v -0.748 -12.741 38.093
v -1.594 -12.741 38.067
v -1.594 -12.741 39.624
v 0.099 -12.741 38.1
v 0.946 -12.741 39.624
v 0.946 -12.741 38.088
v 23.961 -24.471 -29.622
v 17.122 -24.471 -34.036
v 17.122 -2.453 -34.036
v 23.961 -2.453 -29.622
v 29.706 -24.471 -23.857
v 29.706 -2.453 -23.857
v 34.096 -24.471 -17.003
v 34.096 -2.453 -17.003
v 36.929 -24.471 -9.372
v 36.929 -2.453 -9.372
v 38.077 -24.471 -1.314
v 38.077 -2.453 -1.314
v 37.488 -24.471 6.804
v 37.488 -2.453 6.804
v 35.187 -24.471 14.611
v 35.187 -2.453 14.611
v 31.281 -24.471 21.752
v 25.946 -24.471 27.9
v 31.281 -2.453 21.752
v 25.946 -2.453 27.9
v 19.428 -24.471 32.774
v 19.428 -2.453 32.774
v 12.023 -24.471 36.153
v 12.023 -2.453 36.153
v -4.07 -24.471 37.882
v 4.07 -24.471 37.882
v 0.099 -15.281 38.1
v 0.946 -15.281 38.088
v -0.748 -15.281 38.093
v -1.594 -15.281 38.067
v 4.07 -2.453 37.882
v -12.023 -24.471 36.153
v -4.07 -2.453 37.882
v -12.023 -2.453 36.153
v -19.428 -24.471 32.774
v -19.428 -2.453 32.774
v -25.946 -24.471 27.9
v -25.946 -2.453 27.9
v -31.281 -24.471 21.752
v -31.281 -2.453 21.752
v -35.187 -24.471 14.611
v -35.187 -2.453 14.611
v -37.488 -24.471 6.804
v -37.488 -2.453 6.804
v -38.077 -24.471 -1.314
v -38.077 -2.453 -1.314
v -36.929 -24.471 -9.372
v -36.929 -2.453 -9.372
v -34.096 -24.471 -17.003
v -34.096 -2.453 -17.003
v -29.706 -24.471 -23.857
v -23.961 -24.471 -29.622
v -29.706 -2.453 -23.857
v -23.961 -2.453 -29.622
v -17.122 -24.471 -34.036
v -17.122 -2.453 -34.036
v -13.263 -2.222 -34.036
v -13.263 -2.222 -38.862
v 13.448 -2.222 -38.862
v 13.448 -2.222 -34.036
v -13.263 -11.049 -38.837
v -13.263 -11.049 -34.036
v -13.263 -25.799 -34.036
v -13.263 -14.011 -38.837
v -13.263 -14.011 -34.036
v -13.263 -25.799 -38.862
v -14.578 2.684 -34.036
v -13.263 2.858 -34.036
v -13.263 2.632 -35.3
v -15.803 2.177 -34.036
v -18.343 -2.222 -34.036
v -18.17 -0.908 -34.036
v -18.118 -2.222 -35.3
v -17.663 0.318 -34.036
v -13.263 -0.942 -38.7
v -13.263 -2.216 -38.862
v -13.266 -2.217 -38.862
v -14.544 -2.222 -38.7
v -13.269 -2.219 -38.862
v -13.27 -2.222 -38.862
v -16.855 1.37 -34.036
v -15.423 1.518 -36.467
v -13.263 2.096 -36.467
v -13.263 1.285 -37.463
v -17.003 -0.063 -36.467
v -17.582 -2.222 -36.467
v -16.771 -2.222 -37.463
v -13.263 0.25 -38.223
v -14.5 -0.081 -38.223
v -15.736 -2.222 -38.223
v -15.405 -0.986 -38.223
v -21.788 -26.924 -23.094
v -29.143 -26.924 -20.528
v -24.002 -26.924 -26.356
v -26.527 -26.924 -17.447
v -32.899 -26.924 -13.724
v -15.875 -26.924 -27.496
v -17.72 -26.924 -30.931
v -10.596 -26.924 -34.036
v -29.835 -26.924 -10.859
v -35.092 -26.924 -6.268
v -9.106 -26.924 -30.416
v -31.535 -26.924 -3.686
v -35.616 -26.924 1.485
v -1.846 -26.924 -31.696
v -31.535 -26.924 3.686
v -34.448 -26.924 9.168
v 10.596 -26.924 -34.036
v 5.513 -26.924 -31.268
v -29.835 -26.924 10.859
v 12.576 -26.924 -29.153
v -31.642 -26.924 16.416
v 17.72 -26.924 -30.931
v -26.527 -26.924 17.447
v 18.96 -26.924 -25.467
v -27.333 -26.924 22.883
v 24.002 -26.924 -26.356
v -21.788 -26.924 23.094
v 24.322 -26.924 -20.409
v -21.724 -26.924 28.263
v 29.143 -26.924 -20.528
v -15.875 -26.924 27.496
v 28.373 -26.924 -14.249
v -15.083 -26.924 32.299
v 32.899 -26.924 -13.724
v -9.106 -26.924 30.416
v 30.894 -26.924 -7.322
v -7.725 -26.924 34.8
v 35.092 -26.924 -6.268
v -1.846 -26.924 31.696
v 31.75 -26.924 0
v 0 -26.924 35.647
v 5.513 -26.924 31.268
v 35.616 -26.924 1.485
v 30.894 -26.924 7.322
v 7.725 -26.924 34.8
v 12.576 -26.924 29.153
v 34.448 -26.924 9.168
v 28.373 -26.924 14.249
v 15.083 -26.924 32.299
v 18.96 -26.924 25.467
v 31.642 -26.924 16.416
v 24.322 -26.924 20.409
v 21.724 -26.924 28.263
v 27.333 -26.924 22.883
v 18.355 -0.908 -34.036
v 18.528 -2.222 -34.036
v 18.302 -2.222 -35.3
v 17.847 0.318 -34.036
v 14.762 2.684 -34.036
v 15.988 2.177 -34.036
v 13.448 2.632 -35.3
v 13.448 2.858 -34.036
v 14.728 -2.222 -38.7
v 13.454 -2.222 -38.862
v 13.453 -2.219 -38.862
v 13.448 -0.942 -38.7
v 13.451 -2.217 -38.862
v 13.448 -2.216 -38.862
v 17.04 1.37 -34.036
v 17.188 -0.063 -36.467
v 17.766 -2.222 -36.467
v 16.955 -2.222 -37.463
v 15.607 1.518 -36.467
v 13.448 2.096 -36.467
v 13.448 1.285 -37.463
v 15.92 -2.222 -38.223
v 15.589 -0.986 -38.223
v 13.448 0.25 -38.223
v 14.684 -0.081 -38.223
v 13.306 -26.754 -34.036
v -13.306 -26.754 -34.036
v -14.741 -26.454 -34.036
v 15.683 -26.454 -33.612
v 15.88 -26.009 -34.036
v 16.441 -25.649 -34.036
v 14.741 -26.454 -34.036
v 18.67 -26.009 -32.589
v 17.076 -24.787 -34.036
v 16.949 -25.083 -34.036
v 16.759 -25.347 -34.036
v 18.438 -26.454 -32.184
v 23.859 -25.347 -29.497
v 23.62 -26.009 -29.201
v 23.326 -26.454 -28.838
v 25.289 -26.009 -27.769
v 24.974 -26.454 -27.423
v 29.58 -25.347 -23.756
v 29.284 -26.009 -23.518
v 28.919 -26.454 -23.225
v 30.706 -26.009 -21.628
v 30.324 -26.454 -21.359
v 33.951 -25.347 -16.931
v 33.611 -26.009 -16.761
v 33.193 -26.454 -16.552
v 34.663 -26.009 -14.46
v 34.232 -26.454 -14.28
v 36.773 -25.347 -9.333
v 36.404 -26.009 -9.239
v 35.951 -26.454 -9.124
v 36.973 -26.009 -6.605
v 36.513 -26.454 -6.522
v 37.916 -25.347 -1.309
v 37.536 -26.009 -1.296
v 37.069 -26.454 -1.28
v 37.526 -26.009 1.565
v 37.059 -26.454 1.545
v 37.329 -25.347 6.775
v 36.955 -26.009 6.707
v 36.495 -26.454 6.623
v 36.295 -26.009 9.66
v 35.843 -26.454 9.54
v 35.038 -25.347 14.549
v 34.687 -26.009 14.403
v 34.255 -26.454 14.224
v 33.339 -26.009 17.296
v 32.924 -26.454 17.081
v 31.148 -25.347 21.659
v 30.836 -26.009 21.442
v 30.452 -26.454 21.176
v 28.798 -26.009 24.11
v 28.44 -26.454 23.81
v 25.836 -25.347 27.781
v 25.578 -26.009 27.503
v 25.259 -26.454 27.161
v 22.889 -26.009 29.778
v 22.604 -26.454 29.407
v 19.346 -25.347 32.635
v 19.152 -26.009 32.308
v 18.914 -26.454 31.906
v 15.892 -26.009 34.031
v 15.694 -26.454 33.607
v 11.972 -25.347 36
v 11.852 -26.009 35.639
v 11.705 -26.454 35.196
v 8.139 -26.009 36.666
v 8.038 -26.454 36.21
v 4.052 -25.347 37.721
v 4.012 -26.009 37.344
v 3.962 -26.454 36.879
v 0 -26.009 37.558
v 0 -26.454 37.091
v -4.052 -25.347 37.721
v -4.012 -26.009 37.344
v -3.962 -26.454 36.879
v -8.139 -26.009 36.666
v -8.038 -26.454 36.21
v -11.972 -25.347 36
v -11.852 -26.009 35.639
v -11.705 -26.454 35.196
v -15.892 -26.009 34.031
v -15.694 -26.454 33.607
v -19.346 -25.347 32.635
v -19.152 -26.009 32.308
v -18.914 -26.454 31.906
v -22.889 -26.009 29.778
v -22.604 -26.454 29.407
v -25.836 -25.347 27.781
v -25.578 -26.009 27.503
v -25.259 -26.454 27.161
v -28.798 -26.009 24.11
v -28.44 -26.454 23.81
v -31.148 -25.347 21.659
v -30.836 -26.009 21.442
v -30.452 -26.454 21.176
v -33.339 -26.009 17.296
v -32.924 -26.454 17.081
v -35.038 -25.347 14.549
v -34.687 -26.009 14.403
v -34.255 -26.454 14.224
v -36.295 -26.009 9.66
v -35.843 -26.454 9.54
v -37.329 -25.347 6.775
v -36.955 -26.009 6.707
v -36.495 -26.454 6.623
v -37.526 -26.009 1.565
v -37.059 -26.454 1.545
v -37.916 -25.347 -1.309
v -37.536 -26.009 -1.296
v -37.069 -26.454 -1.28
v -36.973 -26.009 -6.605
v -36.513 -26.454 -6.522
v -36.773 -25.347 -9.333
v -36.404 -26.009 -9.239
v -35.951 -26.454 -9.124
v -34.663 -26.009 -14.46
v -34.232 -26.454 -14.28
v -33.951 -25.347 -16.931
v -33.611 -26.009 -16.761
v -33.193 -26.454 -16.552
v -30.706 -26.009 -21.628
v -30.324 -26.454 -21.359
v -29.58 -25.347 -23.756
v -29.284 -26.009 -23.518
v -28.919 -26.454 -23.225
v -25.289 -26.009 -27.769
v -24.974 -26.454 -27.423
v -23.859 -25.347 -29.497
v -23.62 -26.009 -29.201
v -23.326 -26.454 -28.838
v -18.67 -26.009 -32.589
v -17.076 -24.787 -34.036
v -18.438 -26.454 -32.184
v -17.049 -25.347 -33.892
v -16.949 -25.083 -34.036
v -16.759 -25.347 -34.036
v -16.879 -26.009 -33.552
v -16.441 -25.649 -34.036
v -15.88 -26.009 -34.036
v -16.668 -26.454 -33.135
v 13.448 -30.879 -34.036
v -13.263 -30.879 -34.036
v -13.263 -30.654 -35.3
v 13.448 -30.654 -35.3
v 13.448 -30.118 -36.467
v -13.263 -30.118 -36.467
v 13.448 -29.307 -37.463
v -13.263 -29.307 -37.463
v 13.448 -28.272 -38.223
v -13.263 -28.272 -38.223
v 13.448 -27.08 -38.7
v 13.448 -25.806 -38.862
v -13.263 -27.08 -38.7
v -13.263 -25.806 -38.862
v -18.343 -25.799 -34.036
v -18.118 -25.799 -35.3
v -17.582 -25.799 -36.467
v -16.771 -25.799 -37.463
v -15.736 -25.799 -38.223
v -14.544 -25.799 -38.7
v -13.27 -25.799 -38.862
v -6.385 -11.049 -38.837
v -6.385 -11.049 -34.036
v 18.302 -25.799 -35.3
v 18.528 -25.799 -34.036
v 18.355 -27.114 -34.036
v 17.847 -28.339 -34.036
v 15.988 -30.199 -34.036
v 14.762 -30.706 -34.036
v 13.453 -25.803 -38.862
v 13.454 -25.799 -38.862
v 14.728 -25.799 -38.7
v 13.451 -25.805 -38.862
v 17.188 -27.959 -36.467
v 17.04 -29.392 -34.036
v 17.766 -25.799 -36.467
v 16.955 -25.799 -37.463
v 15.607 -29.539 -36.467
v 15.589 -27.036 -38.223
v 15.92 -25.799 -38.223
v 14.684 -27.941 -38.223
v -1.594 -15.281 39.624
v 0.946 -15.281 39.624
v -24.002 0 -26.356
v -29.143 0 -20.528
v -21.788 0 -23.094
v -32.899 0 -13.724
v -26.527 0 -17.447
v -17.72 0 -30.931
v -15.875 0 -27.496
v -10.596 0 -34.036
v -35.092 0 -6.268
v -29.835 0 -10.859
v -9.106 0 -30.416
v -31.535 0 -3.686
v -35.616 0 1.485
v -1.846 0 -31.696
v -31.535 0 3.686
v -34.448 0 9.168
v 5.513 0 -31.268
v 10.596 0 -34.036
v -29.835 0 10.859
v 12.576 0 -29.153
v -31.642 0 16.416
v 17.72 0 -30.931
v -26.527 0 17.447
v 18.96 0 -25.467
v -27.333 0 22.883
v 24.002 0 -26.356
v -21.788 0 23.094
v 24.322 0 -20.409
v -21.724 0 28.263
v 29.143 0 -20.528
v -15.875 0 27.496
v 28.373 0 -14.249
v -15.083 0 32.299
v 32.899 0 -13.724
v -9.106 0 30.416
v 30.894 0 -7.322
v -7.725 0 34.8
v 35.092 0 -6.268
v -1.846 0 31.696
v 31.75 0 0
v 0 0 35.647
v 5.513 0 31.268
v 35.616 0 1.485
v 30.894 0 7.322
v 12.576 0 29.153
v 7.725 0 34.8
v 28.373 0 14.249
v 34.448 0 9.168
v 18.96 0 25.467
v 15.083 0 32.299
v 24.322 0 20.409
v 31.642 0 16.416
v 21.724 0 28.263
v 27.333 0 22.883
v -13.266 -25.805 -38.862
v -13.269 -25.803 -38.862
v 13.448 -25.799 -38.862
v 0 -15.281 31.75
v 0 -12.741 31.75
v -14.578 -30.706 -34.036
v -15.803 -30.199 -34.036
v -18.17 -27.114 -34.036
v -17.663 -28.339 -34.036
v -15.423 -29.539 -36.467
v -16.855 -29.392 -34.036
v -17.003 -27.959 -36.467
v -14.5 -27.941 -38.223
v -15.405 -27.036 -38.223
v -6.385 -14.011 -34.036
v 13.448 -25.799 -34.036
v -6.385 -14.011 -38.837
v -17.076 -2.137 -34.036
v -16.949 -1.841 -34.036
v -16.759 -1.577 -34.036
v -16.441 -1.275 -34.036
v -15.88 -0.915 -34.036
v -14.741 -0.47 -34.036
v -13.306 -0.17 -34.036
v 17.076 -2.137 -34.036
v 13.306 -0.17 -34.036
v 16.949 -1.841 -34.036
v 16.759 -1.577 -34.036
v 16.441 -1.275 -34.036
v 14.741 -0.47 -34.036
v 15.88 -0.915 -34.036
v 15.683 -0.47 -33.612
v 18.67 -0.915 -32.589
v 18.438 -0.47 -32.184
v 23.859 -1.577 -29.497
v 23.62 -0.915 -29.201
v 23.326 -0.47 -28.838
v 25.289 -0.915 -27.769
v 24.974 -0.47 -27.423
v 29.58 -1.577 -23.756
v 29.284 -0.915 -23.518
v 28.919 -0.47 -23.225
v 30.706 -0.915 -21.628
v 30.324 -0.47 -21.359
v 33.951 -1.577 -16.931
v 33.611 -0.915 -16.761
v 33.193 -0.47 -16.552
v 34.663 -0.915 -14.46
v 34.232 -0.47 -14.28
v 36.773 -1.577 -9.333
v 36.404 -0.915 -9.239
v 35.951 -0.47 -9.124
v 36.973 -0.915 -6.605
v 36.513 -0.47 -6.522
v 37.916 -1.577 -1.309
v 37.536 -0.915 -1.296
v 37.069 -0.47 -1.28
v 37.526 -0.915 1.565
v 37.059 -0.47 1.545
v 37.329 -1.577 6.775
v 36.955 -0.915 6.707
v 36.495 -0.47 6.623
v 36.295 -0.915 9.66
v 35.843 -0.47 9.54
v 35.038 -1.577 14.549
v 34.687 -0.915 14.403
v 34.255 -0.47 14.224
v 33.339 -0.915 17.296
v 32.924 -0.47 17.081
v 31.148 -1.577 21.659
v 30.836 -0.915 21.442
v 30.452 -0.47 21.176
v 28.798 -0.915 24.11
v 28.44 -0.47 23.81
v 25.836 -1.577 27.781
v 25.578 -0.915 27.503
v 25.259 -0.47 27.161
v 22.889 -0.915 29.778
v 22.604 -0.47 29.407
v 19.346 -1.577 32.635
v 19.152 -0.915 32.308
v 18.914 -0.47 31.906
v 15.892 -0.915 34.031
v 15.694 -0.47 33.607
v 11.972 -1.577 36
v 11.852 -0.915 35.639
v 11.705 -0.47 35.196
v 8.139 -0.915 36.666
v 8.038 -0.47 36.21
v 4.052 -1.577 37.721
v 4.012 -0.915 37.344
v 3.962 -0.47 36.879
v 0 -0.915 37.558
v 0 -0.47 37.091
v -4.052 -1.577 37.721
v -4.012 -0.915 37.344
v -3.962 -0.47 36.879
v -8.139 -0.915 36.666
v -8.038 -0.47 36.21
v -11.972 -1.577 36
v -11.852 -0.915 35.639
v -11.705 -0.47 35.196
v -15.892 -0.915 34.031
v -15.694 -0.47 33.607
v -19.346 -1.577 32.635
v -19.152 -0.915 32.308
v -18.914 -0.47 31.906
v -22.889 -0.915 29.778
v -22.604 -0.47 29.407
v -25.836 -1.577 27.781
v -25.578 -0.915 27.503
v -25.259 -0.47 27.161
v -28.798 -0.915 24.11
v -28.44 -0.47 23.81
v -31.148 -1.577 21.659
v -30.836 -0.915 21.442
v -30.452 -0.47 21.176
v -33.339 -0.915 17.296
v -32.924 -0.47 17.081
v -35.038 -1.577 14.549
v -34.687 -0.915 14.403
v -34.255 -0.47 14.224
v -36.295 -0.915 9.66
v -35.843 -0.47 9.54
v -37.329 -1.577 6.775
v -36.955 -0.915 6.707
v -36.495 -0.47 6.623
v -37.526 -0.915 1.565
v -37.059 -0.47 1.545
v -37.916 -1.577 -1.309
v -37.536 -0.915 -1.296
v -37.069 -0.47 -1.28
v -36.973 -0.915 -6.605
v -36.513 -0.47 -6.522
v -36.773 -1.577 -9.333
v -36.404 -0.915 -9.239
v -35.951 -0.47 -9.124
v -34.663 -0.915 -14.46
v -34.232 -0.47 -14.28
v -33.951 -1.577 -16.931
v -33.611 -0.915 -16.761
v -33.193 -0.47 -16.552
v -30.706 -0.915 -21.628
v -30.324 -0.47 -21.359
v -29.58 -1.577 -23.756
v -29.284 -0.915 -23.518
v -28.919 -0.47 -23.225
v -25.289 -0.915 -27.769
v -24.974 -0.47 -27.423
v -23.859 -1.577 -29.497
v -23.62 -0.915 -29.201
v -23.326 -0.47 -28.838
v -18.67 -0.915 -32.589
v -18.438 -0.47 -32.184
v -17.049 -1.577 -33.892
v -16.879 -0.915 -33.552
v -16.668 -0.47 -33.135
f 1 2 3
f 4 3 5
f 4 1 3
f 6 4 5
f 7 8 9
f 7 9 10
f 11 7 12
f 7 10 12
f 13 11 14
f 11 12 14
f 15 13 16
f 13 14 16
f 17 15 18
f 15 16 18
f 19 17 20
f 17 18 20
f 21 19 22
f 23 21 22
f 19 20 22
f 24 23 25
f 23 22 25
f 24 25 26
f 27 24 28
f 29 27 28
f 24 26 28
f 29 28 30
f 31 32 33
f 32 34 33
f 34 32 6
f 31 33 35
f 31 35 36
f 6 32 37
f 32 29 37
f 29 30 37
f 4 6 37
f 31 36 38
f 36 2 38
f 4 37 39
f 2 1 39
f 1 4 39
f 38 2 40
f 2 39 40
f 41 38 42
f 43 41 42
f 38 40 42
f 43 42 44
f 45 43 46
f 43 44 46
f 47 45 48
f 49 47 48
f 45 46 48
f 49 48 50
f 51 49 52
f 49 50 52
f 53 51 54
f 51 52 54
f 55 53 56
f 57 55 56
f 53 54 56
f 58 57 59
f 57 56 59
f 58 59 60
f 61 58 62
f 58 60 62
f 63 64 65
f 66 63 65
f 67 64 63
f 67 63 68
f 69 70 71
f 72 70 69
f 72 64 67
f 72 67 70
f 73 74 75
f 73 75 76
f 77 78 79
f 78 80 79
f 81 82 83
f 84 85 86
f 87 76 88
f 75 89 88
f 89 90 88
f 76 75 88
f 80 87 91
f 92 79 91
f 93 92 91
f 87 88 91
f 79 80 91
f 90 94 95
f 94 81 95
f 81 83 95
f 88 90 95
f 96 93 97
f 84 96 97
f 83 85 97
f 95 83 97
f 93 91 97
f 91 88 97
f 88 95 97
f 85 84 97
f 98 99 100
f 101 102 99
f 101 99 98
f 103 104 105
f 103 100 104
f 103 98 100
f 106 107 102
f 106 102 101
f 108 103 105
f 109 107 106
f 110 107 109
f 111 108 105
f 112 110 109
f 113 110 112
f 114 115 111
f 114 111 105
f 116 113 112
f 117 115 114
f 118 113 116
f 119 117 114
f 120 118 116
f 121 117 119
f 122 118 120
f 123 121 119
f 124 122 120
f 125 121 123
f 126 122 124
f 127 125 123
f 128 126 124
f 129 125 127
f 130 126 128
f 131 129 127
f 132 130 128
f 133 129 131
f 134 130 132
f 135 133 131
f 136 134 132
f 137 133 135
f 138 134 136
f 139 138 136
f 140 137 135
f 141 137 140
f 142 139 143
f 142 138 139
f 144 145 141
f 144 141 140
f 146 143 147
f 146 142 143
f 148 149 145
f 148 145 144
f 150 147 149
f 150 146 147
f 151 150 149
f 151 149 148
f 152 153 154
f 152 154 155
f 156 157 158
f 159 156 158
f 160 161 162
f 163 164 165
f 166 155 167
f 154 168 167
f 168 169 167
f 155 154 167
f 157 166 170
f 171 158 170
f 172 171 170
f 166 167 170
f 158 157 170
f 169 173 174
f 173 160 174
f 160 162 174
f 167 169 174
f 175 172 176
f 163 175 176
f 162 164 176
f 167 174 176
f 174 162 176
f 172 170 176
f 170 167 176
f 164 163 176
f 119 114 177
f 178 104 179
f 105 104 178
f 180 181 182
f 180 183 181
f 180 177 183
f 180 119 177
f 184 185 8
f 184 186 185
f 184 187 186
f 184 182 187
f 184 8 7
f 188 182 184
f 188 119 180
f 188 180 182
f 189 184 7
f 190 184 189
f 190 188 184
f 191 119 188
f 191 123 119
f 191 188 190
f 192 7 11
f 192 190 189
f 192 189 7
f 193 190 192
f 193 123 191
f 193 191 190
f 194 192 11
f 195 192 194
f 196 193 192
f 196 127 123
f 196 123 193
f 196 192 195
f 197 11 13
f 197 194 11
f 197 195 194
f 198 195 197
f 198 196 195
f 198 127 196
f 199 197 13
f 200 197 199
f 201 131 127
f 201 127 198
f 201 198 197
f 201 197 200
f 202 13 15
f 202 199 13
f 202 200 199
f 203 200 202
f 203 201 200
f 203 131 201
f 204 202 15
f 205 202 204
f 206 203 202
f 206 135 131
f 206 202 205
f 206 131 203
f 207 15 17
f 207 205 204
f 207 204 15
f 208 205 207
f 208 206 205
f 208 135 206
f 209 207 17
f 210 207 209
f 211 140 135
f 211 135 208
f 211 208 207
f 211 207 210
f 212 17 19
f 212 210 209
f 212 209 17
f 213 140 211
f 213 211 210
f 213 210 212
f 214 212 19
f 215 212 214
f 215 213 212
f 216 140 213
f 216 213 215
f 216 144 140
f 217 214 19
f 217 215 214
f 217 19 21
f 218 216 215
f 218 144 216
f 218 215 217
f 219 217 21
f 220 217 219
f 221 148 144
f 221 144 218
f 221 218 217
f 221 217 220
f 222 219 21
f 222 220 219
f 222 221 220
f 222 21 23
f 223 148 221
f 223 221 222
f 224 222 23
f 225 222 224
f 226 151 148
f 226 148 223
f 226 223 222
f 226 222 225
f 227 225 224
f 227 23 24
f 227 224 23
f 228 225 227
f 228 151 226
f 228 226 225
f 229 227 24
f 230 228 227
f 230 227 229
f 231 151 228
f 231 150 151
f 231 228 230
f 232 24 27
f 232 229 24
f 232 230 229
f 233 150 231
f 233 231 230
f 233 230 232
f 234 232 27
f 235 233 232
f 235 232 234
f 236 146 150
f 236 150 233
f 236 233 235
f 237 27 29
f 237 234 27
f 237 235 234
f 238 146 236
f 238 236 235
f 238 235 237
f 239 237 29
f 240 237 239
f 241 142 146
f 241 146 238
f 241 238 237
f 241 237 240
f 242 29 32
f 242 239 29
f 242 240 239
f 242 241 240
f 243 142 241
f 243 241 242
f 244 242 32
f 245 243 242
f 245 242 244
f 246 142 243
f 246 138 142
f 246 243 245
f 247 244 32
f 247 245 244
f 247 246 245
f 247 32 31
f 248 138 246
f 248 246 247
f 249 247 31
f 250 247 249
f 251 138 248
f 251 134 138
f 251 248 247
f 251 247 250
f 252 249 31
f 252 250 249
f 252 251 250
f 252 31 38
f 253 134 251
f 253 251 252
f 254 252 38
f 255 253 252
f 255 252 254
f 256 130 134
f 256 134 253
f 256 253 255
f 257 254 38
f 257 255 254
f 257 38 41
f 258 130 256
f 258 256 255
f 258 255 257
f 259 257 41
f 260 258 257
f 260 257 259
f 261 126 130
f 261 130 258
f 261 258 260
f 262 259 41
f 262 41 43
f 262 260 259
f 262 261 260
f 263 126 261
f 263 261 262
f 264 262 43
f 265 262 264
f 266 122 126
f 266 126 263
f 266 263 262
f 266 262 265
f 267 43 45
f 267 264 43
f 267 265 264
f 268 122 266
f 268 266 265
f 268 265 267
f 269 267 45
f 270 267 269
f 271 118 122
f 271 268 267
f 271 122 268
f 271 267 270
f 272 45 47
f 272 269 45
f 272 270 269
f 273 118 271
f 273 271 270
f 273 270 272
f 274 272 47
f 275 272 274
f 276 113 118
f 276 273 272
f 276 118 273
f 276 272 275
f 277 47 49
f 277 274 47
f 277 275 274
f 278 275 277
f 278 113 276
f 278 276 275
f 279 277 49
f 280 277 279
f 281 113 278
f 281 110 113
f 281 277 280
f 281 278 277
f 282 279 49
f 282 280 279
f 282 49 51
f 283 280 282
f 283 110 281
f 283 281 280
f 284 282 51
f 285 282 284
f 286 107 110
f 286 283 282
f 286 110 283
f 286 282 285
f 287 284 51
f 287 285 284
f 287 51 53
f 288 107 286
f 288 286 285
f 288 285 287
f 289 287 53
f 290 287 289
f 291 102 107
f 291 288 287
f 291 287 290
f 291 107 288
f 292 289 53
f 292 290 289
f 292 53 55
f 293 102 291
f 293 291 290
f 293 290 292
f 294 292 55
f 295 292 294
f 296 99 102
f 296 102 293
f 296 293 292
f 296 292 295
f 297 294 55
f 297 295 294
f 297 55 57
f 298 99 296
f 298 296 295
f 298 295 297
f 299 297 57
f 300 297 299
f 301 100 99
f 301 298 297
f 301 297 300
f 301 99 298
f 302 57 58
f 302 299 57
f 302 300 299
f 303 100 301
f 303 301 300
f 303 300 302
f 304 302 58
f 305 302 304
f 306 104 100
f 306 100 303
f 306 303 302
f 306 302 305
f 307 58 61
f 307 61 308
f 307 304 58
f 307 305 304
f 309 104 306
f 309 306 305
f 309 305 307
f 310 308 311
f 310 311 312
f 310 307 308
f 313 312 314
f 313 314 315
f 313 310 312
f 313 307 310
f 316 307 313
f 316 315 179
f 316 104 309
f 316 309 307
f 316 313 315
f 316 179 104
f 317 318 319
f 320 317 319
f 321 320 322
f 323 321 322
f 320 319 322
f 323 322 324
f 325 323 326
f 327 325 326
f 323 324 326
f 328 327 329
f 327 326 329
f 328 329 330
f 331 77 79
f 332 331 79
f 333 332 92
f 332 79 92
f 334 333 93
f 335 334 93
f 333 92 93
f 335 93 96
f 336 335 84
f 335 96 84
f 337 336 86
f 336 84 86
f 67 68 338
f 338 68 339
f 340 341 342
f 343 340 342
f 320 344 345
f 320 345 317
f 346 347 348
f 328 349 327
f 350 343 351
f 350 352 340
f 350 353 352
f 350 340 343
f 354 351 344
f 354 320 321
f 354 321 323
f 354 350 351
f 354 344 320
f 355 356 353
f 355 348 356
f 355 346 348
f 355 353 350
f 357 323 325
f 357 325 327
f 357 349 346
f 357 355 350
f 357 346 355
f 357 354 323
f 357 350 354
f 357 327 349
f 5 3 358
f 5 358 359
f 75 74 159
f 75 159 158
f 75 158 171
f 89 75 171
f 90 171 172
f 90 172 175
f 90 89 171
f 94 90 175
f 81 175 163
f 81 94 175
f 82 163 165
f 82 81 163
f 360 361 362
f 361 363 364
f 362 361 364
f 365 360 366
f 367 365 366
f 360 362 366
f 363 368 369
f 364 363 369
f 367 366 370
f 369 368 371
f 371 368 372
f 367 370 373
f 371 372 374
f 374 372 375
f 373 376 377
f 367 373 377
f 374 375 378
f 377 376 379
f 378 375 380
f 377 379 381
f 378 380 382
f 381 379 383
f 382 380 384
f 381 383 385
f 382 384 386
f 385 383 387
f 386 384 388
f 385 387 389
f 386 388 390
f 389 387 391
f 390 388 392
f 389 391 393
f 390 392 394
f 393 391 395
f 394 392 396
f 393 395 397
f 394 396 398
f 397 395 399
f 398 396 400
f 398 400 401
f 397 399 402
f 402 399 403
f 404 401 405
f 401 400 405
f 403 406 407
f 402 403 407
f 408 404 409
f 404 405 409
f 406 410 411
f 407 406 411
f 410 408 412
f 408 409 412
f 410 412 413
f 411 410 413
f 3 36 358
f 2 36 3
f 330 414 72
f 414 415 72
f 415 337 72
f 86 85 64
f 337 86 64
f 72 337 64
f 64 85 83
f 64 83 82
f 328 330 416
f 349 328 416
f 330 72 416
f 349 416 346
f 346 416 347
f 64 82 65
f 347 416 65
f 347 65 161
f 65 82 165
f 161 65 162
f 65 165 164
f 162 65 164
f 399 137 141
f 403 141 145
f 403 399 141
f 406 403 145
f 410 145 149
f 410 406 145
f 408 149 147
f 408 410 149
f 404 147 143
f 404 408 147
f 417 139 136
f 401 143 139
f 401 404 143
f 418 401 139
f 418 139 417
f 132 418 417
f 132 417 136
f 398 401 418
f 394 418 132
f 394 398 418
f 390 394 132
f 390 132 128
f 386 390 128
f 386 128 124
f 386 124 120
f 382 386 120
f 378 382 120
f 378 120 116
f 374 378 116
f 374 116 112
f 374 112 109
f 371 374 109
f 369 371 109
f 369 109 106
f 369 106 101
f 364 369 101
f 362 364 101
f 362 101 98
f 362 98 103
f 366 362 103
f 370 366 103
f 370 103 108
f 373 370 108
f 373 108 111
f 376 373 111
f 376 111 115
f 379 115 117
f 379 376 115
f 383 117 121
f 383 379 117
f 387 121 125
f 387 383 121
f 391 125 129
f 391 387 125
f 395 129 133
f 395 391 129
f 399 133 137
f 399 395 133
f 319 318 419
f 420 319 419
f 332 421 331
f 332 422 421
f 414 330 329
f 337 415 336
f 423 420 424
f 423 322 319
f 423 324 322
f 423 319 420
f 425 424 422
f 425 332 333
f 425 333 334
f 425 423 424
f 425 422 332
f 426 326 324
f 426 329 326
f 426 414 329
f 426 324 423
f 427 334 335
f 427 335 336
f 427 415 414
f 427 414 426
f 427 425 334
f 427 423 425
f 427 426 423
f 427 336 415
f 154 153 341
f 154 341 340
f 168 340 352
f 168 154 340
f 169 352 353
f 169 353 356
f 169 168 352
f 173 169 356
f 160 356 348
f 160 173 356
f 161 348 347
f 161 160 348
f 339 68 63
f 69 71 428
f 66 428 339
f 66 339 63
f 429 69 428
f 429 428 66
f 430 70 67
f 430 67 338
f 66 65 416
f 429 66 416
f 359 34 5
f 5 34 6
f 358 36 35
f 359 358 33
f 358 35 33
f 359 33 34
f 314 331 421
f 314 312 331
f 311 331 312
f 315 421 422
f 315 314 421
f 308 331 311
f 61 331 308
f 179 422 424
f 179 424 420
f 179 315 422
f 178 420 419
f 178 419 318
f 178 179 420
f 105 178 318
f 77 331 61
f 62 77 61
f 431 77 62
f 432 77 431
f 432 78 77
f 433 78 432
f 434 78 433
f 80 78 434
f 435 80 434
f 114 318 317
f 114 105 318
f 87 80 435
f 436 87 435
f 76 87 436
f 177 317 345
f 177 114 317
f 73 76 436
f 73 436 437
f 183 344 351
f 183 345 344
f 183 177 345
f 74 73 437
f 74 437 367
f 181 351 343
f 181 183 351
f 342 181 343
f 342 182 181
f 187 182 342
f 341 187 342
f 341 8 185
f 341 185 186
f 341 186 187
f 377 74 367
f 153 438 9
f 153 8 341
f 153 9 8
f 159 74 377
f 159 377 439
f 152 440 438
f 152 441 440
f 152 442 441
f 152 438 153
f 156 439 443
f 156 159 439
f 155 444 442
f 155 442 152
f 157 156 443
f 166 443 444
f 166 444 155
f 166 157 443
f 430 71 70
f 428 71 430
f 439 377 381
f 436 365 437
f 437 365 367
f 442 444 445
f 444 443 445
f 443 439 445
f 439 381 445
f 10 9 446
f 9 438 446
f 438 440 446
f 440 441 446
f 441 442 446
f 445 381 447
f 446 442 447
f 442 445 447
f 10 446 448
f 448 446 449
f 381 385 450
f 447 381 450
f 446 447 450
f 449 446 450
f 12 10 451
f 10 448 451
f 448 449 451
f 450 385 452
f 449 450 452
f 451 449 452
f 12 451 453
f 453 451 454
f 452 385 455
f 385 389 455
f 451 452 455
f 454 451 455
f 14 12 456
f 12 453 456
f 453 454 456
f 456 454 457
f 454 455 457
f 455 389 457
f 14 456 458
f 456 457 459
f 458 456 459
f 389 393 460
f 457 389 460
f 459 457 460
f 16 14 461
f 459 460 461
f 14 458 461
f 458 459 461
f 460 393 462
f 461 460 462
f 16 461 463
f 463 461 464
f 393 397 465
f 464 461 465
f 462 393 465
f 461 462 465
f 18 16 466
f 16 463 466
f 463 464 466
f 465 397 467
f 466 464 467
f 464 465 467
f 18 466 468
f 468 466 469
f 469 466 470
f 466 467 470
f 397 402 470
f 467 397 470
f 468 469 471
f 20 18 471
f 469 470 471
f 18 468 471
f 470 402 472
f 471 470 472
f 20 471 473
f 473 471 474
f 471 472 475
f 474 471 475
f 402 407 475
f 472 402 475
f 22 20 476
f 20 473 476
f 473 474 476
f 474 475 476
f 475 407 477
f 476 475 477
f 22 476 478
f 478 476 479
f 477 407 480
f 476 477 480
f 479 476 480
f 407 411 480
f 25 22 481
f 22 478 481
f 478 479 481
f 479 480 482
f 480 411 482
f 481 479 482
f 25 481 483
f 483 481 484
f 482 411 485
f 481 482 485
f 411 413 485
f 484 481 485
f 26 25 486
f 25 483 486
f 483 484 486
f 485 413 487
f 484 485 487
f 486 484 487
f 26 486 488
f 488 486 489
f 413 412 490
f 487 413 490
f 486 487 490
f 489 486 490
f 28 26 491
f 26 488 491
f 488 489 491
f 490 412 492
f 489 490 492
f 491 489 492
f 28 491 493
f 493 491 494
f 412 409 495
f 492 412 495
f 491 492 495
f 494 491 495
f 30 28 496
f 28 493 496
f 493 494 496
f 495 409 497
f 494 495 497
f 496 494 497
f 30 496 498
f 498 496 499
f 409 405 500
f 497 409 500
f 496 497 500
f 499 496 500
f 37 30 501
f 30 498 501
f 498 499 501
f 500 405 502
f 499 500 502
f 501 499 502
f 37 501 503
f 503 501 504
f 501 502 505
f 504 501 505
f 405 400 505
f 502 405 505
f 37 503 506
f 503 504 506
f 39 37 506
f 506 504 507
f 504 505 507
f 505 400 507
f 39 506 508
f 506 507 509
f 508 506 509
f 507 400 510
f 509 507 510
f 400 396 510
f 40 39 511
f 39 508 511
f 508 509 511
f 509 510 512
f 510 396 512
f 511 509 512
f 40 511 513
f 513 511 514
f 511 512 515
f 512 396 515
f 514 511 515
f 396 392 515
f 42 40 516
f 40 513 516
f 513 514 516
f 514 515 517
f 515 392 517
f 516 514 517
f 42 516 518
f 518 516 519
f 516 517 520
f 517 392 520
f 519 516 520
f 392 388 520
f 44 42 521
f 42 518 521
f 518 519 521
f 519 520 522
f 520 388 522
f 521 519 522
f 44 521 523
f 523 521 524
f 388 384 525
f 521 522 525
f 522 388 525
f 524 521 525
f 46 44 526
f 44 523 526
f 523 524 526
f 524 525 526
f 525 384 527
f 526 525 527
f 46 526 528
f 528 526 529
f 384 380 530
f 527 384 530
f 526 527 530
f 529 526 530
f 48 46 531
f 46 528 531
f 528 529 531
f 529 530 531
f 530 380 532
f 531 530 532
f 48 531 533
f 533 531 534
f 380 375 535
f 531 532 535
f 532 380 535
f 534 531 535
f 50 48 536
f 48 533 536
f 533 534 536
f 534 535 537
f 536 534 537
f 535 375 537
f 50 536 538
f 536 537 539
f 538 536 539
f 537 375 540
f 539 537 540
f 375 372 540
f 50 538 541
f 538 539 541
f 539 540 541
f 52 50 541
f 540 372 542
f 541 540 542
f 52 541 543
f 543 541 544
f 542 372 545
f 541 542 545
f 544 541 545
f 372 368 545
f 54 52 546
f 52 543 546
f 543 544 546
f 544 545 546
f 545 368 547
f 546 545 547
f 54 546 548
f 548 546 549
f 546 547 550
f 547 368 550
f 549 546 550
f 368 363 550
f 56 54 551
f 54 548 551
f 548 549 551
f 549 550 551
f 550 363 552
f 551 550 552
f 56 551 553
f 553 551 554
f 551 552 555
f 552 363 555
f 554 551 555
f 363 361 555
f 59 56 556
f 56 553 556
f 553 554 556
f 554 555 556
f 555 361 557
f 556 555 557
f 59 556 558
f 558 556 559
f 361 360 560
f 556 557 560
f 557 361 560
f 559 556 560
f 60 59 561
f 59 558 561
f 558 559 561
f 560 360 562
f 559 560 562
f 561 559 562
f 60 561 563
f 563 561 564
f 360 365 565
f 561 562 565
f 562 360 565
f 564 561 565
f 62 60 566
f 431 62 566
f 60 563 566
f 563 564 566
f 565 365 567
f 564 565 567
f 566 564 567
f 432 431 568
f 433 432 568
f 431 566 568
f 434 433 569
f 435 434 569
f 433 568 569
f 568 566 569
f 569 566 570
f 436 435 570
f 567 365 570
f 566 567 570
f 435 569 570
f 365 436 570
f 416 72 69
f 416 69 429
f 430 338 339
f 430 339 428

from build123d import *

# Parameters (mm, degrees)
F0_R         = 38.1
F0_R_2       = 31.75
F1_DEPTH     = 26.924
F2_R         = 2.4528409794
F4_START     = -34.036
F3_W         = 36.8709713221
F3_H         = 33.7369362824
F4_DEPTH     = 4.826
F5_R         = 5.08
F6_W         = 26.7109713221
F6_H         = 23.5769362824
F7_DEPTH     = 4.826
F8_T1_DEPTH  = 26.7109713221
F8_T3_DEPTH  = 23.5769362824
F8_T6_ANGLE  = 90
F8_T8_ANGLE  = 90
F8_T10_ANGLE = 90
F8_T12_ANGLE = 90
F9_W         = 6.8778875601
F9_H         = 2.9623268638
F10_DEPTH    = 4.8006
F12_START    = 31.75
F11_W        = 2.54
F11_H        = 2.54
F12_DEPTH    = 7.874


# Not quite as in the source:
# - a fillet or chamfer that OpenCascade refuses, or shapes differently, is made with other operations: its cross-section is extruded or revolved along the edge and cut away or added


with BuildPart() as f1:
    # F0 (on Front) → F1 (new body)
    with BuildSketch(Plane.XZ):
        Circle(F0_R)
        Circle(F0_R_2, mode=Mode.SUBTRACT)
    extrude(amount=F1_DEPTH)

    # F2
    f2_edges = [f1.edges().sort_by_distance(p)[0] for p in [
        (-38.1, -26.924, 0),
        (-38.1, 0, 0),
    ]]
    fillet(f2_edges, radius=F2_R)

    # F3 (on Top) → F4 (join)
    with BuildSketch(Plane.XY.offset(F4_START)):
        with Locations((0.0921785831, -14.0109679196)):
            Rectangle(F3_W, F3_H)
    extrude(amount=-F4_DEPTH)

    # F5
    f5_edges = [f1.edges().sort_by_distance(p)[0] for p in [
        (-18.343307, 2.8575, -36.449),
        (18.527664, 2.8575, -36.449),
        (18.527664, -30.879436, -36.449),
        (-18.343307, -30.879436, -36.449),
    ]]
    fillet(f5_edges, radius=F5_R)

    # F6 (on face) → F7 (cut)
    with BuildSketch(Plane(origin=(0, 0, -38.862), x_dir=(1, 0, 0), z_dir=(0, 0, -1))):
        with Locations((0.0921785831, 14.0109679196)):
            Rectangle(F6_W, F6_H)
    extrude(amount=-F7_DEPTH, mode=Mode.SUBTRACT)

    # F8: fillet of radius 5.08 on 1 edges, made by hand

    # F8_s2 → F8_t1 (cut)
    with BuildSketch(Plane.YZ.offset(-13.2633070779)):
        with BuildLine():
            ThreePointArc((-30.8794360608, -34.036), (-29.3069384175, -37.4628096935), (-25.8057900345, -38.862))
            Line((-25.8057900345, -38.862), (-30.8794360608, -38.862))
            Line((-30.8794360608, -38.862), (-30.8794360608, -34.036))
        make_face()
        with BuildLine():
            ThreePointArc((2.8575002216, -34.036), (1.2850025783, -37.4628096935), (-2.2161458047, -38.862))
            Line((-2.2161458047, -38.862), (2.8575002216, -38.862))
            Line((2.8575002216, -38.862), (2.8575002216, -34.036))
        make_face()
    extrude(amount=F8_T1_DEPTH, mode=Mode.SUBTRACT)

    # F8_s4 → F8_t3 (cut)
    with BuildSketch(Plane.XZ.offset(2.2224997784)):
        with BuildLine():
            ThreePointArc((18.5276642442, -34.036), (16.9551666009, -37.4628096935), (13.4540182179, -38.862))
            Line((13.4540182179, -38.862), (18.5276642442, -38.862))
            Line((18.5276642442, -38.862), (18.5276642442, -34.036))
        make_face()
        with BuildLine():
            ThreePointArc((-18.3433070779, -34.036), (-16.7708094346, -37.4628096935), (-13.2696610516, -38.862))
            Line((-13.2696610516, -38.862), (-18.3433070779, -38.862))
            Line((-18.3433070779, -38.862), (-18.3433070779, -34.036))
        make_face()
    extrude(amount=F8_T3_DEPTH, mode=Mode.SUBTRACT)

    # F8_s5 → F8_t6 (revolve, cut)
    with BuildSketch(Plane.YZ.offset(-13.2633070779)):
        with BuildLine():
            ThreePointArc((-30.8794360608, -34.036), (-29.3069384175, -37.4628096935), (-25.8057900345, -38.862))
            Line((-25.8057900345, -38.862), (-30.8794360608, -38.862))
            Line((-30.8794360608, -38.862), (-30.8794360608, -34.036))
        make_face()
    revolve(axis=Axis((-13.2633070779, -25.7994360608, -38.862), (0, 0, -1)), revolution_arc=F8_T6_ANGLE, mode=Mode.SUBTRACT)

    # F8_s7 → F8_t8 (revolve, cut)
    with BuildSketch(Plane.XZ.offset(25.7994360608)):
        with BuildLine():
            ThreePointArc((18.5276642442, -34.036), (16.9551666009, -37.4628096935), (13.4540182179, -38.862))
            Line((13.4540182179, -38.862), (18.5276642442, -38.862))
            Line((18.5276642442, -38.862), (18.5276642442, -34.036))
        make_face()
    revolve(axis=Axis((13.4476642442, -25.7994360608, -38.862), (0, 0, -1)), revolution_arc=F8_T8_ANGLE, mode=Mode.SUBTRACT)

    # F8_s9 → F8_t10 (revolve, cut)
    with BuildSketch(Plane.XZ.offset(2.2224997784)):
        with BuildLine():
            ThreePointArc((18.5276642442, -34.036), (16.9551666009, -37.4628096935), (13.4540182179, -38.862))
            Line((13.4540182179, -38.862), (18.5276642442, -38.862))
            Line((18.5276642442, -38.862), (18.5276642442, -34.036))
        make_face()
    revolve(axis=Axis((13.4476642442, -2.2224997784, -38.862), (0, 0, 1)), revolution_arc=F8_T10_ANGLE, mode=Mode.SUBTRACT)

    # F8_s11 → F8_t12 (revolve, cut)
    with BuildSketch(Plane.YZ.offset(-13.2633070779)):
        with BuildLine():
            ThreePointArc((2.8575002216, -34.036), (1.2850025783, -37.4628096935), (-2.2161458047, -38.862))
            Line((-2.2161458047, -38.862), (2.8575002216, -38.862))
            Line((2.8575002216, -38.862), (2.8575002216, -34.036))
        make_face()
    revolve(axis=Axis((-13.2633070779, -2.2224997784, -38.862), (0, 0, 1)), revolution_arc=F8_T12_ANGLE, mode=Mode.SUBTRACT)

    # F9 (on face) → F10 (join)
    with BuildSketch(Plane(origin=(0, 0, -34.036), x_dir=(1, 0, 0), z_dir=(0, 0, -1))):
        with Locations((-9.8243632978, 12.5298044877)):
            Rectangle(F9_W, F9_H)
    extrude(amount=F10_DEPTH)

    # F11 (on Top) → F12 (join)
    with BuildSketch(Plane.XY.offset(F12_START)):
        with Locations((-0.3243902236, -14.0109681524)):
            Rectangle(F11_W, F11_H)
    extrude(amount=F12_DEPTH)


solid = f1.part
